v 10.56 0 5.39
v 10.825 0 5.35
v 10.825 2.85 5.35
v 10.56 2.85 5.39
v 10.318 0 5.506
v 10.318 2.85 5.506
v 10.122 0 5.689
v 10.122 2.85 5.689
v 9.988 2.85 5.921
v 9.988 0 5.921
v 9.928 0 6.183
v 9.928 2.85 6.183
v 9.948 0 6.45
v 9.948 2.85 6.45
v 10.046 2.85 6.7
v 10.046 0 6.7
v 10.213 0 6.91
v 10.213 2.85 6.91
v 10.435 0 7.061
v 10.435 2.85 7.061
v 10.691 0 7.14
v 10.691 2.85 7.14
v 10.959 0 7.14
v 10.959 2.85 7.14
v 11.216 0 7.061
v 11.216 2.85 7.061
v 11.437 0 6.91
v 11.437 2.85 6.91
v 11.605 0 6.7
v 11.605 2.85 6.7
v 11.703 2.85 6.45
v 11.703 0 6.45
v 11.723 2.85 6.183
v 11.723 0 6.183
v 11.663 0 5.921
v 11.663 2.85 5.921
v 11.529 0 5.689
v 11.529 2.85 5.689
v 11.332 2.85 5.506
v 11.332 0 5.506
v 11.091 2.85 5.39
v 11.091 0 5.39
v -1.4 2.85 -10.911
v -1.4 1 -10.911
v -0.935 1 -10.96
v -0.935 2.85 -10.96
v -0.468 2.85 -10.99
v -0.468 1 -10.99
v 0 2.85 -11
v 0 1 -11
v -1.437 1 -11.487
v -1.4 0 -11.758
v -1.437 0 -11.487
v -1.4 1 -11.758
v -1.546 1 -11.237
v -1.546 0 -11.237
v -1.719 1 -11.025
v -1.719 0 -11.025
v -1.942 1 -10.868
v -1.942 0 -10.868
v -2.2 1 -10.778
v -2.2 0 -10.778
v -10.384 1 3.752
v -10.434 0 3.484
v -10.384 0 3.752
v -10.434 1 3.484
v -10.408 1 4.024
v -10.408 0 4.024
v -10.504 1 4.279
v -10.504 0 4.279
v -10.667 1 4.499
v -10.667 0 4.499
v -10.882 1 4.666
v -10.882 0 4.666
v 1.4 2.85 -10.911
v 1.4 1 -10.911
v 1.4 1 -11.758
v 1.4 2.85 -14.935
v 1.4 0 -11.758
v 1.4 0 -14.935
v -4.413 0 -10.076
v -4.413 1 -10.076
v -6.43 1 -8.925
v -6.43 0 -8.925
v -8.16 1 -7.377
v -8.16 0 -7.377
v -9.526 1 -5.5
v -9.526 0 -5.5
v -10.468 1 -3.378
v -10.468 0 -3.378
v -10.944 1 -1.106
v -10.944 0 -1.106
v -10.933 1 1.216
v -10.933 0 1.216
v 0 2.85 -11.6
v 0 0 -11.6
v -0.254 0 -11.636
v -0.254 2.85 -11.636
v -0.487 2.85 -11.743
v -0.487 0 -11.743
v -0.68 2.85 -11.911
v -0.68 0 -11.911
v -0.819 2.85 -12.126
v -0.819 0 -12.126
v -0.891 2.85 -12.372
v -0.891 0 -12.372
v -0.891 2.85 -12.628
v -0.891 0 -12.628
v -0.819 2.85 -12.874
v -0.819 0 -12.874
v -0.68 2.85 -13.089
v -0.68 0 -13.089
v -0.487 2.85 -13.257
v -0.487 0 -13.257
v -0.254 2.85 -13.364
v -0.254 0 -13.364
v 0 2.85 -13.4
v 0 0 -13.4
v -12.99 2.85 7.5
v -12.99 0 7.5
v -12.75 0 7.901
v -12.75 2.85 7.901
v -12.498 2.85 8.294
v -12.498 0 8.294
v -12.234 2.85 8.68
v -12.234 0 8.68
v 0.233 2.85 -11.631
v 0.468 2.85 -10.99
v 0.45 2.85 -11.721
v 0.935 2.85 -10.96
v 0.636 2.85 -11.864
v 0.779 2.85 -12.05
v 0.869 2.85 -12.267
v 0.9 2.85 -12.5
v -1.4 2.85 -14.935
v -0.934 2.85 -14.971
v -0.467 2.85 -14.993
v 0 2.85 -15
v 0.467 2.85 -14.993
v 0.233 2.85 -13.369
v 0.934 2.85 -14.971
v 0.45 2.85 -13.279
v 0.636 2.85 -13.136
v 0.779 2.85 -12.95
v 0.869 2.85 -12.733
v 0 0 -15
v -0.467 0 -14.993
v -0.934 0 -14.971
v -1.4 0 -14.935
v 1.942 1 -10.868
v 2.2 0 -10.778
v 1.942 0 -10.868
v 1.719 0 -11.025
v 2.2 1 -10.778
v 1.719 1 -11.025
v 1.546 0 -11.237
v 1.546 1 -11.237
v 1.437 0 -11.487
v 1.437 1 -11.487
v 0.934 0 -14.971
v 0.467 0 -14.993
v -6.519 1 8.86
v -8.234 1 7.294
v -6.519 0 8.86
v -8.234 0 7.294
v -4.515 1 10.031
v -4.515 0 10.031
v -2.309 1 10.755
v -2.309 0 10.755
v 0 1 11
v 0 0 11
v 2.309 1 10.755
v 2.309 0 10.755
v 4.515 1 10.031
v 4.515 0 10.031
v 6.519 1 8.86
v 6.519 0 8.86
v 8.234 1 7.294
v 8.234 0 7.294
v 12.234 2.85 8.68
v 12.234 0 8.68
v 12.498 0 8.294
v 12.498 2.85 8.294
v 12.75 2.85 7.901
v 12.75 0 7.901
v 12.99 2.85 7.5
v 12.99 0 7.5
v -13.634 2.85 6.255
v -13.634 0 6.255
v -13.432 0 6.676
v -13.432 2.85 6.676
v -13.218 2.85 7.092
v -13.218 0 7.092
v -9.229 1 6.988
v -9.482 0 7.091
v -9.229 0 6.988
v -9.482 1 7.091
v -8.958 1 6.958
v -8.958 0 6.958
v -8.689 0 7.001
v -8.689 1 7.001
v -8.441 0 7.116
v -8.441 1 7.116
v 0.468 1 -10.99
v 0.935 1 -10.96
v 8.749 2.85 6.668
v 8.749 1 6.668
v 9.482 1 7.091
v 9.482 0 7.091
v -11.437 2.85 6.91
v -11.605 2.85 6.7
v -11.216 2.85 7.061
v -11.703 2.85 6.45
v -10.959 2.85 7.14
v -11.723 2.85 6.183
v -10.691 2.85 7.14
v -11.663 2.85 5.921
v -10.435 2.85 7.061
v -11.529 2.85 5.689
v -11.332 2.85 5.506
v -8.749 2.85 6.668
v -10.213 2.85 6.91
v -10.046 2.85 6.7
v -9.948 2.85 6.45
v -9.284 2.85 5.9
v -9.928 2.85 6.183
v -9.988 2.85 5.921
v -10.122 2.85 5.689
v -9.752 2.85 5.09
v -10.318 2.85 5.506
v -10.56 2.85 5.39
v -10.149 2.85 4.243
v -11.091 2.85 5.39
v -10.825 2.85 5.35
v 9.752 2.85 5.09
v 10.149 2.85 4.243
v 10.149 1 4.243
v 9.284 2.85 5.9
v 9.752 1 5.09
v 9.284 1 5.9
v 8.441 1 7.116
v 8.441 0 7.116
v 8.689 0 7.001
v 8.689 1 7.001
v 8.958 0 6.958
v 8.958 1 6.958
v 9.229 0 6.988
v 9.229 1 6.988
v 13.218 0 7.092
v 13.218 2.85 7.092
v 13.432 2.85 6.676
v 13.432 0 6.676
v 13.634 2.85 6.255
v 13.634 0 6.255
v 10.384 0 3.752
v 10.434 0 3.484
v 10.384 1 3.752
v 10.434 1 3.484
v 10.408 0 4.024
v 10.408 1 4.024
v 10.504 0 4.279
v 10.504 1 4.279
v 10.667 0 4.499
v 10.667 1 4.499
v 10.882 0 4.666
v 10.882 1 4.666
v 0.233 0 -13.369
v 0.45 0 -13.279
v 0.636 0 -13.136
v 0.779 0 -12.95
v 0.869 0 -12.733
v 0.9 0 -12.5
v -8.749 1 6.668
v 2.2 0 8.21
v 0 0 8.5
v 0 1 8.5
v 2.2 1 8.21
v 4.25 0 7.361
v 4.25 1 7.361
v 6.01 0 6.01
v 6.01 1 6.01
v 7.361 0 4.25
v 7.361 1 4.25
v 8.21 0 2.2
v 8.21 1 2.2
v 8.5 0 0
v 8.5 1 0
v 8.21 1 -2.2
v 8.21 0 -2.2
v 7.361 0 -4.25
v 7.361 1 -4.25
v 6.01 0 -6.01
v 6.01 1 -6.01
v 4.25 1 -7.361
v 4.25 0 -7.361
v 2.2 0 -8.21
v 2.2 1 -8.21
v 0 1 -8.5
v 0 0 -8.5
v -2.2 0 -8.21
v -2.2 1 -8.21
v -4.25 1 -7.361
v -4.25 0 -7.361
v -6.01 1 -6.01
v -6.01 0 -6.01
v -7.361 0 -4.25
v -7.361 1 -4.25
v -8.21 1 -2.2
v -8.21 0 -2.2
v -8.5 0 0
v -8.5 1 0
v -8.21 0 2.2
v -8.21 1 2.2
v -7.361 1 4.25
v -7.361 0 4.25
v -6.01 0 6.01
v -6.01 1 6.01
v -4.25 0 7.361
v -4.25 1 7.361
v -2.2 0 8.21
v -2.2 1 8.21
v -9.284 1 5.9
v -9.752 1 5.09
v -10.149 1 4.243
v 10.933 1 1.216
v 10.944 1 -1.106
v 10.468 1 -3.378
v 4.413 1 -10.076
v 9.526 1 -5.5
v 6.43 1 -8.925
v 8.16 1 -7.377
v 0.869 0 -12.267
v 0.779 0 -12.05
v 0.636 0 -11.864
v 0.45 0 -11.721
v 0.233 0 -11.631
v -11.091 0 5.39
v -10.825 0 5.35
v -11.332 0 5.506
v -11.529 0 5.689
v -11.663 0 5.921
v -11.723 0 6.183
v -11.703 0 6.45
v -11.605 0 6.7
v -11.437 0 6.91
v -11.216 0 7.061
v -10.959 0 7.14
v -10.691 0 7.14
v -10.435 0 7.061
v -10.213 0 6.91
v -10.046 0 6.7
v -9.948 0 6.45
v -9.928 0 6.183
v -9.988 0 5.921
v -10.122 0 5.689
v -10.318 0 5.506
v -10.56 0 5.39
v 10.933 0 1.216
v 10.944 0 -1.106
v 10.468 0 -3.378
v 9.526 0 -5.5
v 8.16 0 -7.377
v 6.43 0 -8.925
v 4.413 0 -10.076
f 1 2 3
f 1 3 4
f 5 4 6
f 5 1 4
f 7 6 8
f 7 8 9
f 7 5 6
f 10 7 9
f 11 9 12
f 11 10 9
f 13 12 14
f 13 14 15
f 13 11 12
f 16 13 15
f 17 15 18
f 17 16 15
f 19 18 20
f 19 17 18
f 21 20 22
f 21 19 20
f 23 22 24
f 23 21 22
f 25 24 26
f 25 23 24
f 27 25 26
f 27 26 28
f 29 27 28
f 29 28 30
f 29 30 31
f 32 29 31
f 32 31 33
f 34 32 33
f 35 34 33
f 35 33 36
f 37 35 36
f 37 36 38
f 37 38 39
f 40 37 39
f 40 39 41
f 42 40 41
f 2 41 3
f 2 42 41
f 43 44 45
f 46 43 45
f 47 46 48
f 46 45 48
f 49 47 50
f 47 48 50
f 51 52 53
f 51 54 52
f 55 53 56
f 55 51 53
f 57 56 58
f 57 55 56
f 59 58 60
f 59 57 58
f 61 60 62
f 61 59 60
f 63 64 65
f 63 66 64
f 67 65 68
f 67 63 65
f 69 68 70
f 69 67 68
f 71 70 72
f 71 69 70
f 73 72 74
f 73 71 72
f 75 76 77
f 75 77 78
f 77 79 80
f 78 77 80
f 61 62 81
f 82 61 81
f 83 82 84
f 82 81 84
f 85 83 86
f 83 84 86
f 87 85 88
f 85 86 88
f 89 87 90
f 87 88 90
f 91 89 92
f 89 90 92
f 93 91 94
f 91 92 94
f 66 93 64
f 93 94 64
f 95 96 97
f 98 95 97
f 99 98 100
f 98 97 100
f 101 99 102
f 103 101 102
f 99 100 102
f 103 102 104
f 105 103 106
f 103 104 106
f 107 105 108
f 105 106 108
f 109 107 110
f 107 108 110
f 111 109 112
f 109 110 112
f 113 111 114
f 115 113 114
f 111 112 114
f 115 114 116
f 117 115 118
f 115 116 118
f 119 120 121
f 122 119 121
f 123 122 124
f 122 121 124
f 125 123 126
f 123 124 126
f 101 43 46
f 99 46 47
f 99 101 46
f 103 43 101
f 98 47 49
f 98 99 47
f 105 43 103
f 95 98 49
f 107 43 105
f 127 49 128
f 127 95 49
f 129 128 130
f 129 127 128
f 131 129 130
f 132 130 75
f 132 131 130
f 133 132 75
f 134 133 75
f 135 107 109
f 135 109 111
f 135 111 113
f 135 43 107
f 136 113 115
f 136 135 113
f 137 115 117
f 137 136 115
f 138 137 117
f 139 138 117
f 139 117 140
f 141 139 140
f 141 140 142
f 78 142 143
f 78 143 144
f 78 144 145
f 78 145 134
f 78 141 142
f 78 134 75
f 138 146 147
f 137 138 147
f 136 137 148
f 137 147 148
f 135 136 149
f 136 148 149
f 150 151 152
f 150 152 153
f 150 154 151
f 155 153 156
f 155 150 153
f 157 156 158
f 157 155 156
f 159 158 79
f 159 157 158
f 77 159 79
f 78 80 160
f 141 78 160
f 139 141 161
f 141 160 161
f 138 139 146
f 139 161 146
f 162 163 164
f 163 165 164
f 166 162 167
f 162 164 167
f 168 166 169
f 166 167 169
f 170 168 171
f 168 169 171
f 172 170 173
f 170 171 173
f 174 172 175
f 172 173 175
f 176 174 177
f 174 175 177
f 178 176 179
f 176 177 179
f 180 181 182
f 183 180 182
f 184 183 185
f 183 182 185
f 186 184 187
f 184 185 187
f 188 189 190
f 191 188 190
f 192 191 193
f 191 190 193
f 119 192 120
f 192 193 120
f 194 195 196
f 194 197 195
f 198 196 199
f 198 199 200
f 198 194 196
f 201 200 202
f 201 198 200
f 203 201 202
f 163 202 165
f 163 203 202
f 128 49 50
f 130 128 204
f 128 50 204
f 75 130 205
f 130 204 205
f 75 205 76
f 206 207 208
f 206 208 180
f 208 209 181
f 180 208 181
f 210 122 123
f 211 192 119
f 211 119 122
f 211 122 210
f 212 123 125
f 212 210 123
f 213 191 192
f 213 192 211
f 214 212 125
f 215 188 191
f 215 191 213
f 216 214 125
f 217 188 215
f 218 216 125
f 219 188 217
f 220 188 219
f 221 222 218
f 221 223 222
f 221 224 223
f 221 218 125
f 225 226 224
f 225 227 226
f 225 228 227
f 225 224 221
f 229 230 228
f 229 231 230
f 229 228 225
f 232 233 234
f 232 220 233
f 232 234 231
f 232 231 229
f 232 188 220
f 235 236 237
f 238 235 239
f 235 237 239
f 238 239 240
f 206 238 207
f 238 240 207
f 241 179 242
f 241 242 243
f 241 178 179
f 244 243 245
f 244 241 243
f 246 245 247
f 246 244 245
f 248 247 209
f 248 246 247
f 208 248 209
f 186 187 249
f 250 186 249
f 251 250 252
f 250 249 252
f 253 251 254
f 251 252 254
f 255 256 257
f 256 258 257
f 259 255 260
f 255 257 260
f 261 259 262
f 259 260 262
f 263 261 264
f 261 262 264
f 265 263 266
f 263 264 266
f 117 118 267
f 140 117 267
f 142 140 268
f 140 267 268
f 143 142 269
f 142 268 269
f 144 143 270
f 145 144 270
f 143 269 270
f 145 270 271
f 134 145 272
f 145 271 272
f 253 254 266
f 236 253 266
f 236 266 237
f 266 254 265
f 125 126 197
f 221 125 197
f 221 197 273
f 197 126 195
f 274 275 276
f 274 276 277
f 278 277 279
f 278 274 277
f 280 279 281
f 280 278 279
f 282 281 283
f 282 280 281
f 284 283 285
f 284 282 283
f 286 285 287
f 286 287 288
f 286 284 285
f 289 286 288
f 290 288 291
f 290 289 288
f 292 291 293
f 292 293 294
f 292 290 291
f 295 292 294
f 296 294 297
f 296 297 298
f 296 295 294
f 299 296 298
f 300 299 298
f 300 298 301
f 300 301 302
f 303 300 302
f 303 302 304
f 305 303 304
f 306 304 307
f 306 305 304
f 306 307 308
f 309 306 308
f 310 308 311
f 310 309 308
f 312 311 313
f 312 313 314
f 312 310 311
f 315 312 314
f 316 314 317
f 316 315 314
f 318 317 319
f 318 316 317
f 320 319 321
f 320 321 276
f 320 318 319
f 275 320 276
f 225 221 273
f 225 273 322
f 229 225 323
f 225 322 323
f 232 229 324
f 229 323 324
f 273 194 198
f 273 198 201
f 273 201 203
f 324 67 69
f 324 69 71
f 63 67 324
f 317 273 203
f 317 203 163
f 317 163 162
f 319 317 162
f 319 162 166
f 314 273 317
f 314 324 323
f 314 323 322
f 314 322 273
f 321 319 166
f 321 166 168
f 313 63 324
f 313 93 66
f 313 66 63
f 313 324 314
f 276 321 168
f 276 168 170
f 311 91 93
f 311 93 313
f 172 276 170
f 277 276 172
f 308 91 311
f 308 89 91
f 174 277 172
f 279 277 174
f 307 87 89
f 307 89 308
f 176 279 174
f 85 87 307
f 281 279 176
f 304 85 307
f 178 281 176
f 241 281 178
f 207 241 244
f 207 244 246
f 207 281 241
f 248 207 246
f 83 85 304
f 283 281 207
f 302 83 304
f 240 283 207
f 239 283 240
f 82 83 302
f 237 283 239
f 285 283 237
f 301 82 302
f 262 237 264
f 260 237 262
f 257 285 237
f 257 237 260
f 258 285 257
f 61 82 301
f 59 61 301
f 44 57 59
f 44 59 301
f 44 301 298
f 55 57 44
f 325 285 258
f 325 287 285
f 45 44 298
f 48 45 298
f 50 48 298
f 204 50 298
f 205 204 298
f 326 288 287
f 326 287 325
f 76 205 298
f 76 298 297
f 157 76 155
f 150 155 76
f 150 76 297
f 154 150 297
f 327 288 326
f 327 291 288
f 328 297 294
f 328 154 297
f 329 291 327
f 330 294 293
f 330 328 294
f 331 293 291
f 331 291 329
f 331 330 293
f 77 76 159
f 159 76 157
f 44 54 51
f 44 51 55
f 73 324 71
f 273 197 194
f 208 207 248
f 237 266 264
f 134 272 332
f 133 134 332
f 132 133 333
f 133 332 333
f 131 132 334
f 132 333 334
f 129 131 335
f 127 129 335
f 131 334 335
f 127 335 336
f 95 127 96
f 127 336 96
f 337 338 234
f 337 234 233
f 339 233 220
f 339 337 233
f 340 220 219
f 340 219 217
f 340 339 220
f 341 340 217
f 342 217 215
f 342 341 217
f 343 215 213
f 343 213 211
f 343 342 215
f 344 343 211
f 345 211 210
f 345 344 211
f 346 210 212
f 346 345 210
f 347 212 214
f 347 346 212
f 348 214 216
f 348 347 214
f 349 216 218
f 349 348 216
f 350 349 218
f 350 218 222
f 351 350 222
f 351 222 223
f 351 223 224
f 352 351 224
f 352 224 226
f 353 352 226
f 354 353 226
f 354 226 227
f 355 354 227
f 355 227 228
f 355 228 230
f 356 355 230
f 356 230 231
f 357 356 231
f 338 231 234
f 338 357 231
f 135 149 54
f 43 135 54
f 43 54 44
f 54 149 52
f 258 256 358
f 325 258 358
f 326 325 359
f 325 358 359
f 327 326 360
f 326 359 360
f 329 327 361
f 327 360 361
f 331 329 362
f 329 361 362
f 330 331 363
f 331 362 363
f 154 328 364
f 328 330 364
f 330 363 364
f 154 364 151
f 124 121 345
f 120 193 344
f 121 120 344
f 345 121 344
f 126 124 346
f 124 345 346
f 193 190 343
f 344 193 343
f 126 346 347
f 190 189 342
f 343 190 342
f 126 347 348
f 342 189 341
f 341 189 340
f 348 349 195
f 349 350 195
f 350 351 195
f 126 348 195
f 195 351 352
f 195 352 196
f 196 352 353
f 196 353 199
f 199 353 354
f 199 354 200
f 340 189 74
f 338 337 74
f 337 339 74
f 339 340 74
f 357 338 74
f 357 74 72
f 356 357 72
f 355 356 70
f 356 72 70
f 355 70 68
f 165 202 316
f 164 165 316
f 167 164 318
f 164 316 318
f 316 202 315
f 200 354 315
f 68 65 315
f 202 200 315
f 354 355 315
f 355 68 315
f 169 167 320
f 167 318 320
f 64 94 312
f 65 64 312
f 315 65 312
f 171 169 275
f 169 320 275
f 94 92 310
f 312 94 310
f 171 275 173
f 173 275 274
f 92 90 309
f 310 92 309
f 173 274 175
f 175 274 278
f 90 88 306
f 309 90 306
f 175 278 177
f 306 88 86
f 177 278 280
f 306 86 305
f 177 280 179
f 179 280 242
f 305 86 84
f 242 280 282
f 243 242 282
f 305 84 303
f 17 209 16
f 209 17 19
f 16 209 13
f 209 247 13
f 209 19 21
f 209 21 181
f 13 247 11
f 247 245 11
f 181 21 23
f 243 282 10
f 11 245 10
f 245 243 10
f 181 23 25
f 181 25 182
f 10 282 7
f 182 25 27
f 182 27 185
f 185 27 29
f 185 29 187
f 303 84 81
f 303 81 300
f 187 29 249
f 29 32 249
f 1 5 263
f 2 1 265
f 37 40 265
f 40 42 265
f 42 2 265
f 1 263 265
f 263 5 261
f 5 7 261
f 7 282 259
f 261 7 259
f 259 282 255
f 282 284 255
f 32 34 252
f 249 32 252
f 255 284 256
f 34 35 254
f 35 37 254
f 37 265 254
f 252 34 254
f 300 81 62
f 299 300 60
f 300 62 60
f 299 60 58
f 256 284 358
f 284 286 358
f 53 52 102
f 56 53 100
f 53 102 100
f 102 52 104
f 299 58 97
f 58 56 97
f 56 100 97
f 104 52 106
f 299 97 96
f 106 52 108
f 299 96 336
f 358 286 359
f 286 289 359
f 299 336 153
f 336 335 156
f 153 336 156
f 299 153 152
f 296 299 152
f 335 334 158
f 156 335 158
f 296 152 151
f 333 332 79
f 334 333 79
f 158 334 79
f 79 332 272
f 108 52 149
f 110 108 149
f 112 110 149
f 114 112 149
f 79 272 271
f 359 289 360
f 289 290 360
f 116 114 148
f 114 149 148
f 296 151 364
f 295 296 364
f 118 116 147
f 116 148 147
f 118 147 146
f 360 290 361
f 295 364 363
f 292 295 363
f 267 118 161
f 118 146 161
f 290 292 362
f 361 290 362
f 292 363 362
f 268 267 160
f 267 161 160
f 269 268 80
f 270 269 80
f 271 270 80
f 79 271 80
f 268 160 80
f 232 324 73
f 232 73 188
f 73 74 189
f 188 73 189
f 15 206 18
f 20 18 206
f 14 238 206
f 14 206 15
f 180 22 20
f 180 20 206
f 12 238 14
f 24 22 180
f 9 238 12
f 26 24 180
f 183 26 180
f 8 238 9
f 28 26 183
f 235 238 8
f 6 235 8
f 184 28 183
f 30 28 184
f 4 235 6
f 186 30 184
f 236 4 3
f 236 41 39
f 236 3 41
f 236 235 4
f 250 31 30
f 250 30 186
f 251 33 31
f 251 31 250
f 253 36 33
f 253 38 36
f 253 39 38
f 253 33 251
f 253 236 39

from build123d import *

# Parameters (mm, degrees)
SKETCH1_R             = 0.9
BOSS_EXTRUDE1_DEPTH   = 2.85
BOSS_EXTRUDE1_2_DEPTH = 2.85
BOSS_EXTRUDE1_3_DEPTH = 2.85
SKETCH1_3_R           = 8.5
BOSS_EXTRUDE2_DEPTH   = 1
FILLET1_R             = 1


with BuildPart() as part:
    # Sketch1 → Boss-Extrude1 (new body)
    with BuildSketch(Plane(origin=(0, 0, 0), x_dir=(1, 0, 0), z_dir=(0, 1, 0))):
        with BuildLine():
            ThreePointArc((-1.4, 10.910545358), (0, 11), (1.4, 10.910545358))
            Line((1.4, 10.910545358), (1.4, 14.934523762))
            ThreePointArc((1.4, 14.934523762), (0, 15), (-1.4, 14.934523762))
            Line((-1.4, 14.934523762), (-1.4, 10.910545358))
        make_face()
        with Locations((0, 12.5)):
            Circle(SKETCH1_R, mode=Mode.SUBTRACT)
    extrude(amount=BOSS_EXTRUDE1_DEPTH)



with BuildPart() as body_2:
    # Sketch1 → Boss-Extrude1 2 (new body)
    with BuildSketch(Plane(origin=(0, 0, 0), x_dir=(1, 0, 0), z_dir=(0, 1, 0))):
        with BuildLine():
            ThreePointArc((-8.748809449, -6.667708244), (-9.526279442, -5.5), (-10.148809449, -4.242837113))
            Line((-10.148809449, -4.242837113), (-13.633676971, -6.254826316))
            ThreePointArc((-13.633676971, -6.254826316), (-12.990381057, -7.5), (-12.233676971, -8.679697446))
            Line((-12.233676971, -8.679697446), (-8.748809449, -6.667708244))
        make_face()
        with Locations((-10.825317547, -6.25)):
            Circle(SKETCH1_R, mode=Mode.SUBTRACT)
    extrude(amount=BOSS_EXTRUDE1_2_DEPTH)


with BuildPart() as body_3:
    # Sketch1 → Boss-Extrude1 3 (new body)
    with BuildSketch(Plane(origin=(0, 0, 0), x_dir=(1, 0, 0), z_dir=(0, 1, 0))):
        with BuildLine():
            Line((13.633676971, -6.254826316), (10.148809449, -4.242837113))
            ThreePointArc((10.148809449, -4.242837113), (9.526279442, -5.5), (8.748809449, -6.667708244))
            Line((8.748809449, -6.667708244), (12.233676971, -8.679697446))
            ThreePointArc((12.233676971, -8.679697446), (12.990381057, -7.5), (13.633676971, -6.254826316))
        make_face()
        with Locations((10.825317547, -6.25)):
            Circle(SKETCH1_R, mode=Mode.SUBTRACT)
    extrude(amount=BOSS_EXTRUDE1_3_DEPTH)


with BuildPart() as part_1:
    add(part.part)

    add(body_2.part)  # Boss-Extrude2 merges body 2

    add(body_3.part)  # Boss-Extrude2 merges body 3
    # Sketch1<3> → Boss-Extrude2 (add)
    with BuildSketch(Plane(origin=(0, 0, 0), x_dir=(1, 0, 0), z_dir=(0, 1, 0))):
        with BuildLine():
            ThreePointArc((1.4, 10.910545358), (0, 11), (-1.4, 10.910545358))
            ThreePointArc((-1.4, 10.910545358), (-9.526279442, 5.5), (-10.148809449, -4.242837113))
            ThreePointArc((-10.148809449, -4.242837113), (-9.526279442, -5.5), (-8.748809449, -6.667708244))
            ThreePointArc((-8.748809449, -6.667708244), (0, -11), (8.748809449, -6.667708244))
            ThreePointArc((8.748809449, -6.667708244), (9.526279442, -5.5), (10.148809449, -4.242837113))
            ThreePointArc((10.148809449, -4.242837113), (10.785103243, -2.163688525), (11, 0))
            ThreePointArc((11, 0), (8.258329129, 7.26636085), (1.4, 10.910545358))
        make_face()
        Circle(SKETCH1_3_R, mode=Mode.SUBTRACT)
    extrude(amount=BOSS_EXTRUDE2_DEPTH)

    # Fillet1
    fillet1_edges = [part_1.edges().sort_by_distance(p)[0] for p in [
        (1.4, 0.5, -10.910545358),
        (10.148809449, 0.5, 4.242837113),
        (8.748809449, 0.5, 6.667708244),
        (-1.4, 0.5, -10.910545358),
        (-10.148809449, 0.5, 4.242837113),
        (-8.748809449, 0.5, 6.667708244),
    ]]
    fillet(fillet1_edges, radius=FILLET1_R)


solid = part_1.part
